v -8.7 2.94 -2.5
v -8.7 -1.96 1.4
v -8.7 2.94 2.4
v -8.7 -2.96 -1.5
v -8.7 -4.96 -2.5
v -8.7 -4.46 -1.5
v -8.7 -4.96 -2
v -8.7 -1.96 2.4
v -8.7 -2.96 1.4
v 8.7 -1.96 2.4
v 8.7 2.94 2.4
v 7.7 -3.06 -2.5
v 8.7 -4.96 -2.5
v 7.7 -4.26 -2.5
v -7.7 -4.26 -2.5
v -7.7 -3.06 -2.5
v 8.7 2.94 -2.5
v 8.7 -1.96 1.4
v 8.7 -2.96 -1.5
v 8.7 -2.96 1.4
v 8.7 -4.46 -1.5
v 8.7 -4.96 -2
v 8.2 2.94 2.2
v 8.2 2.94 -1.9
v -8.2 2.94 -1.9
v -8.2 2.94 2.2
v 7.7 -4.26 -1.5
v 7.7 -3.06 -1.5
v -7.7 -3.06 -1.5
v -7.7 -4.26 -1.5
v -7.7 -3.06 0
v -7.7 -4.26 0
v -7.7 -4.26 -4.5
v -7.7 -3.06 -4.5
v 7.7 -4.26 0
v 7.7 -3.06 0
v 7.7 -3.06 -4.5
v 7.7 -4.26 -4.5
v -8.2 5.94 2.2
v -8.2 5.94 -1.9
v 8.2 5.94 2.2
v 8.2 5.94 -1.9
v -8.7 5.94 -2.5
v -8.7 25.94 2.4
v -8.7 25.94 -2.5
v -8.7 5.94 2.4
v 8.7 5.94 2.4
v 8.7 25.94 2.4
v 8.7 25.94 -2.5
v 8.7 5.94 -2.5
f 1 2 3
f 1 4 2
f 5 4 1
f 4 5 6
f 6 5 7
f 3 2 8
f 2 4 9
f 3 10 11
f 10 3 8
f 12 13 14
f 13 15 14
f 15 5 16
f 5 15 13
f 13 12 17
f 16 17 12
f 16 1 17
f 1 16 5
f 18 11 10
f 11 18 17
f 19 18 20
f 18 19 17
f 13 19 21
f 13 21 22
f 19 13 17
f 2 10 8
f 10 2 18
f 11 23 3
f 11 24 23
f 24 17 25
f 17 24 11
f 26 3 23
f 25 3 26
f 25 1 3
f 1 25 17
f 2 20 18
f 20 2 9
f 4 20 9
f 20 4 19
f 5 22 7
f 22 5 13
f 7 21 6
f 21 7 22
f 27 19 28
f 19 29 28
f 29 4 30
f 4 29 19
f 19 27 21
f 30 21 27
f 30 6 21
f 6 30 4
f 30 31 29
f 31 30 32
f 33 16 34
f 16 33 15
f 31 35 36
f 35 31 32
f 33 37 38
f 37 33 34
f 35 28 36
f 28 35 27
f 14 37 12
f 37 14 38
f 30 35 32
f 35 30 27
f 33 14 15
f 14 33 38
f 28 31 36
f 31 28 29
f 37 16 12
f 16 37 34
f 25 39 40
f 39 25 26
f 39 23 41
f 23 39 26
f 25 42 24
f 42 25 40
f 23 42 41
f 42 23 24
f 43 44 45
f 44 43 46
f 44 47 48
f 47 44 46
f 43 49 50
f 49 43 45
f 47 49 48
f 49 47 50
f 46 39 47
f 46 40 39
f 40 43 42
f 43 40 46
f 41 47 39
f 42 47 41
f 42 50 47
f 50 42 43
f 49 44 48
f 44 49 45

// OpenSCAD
N=6;
A=2.4+N*2.5;
rotate([0,0,180])
translate([-A/2,-2.94,-2.5])
{
	cube([A,4.9,4.9]);
	cube([A,5.9,3.9]);
	hull()
	{
		cube([A,7.4,1]);
		cube([A,7.9,0.5]);
	}
	translate([1,6,-2])cube([A-2,1.2,4.5]); // Assumes cropped pins
	// Plug
	translate([0.5,-20,0.6])cube([A-1,21,4.1]);
	translate([0,-23,0])cube([A,20,4.9]);
}
